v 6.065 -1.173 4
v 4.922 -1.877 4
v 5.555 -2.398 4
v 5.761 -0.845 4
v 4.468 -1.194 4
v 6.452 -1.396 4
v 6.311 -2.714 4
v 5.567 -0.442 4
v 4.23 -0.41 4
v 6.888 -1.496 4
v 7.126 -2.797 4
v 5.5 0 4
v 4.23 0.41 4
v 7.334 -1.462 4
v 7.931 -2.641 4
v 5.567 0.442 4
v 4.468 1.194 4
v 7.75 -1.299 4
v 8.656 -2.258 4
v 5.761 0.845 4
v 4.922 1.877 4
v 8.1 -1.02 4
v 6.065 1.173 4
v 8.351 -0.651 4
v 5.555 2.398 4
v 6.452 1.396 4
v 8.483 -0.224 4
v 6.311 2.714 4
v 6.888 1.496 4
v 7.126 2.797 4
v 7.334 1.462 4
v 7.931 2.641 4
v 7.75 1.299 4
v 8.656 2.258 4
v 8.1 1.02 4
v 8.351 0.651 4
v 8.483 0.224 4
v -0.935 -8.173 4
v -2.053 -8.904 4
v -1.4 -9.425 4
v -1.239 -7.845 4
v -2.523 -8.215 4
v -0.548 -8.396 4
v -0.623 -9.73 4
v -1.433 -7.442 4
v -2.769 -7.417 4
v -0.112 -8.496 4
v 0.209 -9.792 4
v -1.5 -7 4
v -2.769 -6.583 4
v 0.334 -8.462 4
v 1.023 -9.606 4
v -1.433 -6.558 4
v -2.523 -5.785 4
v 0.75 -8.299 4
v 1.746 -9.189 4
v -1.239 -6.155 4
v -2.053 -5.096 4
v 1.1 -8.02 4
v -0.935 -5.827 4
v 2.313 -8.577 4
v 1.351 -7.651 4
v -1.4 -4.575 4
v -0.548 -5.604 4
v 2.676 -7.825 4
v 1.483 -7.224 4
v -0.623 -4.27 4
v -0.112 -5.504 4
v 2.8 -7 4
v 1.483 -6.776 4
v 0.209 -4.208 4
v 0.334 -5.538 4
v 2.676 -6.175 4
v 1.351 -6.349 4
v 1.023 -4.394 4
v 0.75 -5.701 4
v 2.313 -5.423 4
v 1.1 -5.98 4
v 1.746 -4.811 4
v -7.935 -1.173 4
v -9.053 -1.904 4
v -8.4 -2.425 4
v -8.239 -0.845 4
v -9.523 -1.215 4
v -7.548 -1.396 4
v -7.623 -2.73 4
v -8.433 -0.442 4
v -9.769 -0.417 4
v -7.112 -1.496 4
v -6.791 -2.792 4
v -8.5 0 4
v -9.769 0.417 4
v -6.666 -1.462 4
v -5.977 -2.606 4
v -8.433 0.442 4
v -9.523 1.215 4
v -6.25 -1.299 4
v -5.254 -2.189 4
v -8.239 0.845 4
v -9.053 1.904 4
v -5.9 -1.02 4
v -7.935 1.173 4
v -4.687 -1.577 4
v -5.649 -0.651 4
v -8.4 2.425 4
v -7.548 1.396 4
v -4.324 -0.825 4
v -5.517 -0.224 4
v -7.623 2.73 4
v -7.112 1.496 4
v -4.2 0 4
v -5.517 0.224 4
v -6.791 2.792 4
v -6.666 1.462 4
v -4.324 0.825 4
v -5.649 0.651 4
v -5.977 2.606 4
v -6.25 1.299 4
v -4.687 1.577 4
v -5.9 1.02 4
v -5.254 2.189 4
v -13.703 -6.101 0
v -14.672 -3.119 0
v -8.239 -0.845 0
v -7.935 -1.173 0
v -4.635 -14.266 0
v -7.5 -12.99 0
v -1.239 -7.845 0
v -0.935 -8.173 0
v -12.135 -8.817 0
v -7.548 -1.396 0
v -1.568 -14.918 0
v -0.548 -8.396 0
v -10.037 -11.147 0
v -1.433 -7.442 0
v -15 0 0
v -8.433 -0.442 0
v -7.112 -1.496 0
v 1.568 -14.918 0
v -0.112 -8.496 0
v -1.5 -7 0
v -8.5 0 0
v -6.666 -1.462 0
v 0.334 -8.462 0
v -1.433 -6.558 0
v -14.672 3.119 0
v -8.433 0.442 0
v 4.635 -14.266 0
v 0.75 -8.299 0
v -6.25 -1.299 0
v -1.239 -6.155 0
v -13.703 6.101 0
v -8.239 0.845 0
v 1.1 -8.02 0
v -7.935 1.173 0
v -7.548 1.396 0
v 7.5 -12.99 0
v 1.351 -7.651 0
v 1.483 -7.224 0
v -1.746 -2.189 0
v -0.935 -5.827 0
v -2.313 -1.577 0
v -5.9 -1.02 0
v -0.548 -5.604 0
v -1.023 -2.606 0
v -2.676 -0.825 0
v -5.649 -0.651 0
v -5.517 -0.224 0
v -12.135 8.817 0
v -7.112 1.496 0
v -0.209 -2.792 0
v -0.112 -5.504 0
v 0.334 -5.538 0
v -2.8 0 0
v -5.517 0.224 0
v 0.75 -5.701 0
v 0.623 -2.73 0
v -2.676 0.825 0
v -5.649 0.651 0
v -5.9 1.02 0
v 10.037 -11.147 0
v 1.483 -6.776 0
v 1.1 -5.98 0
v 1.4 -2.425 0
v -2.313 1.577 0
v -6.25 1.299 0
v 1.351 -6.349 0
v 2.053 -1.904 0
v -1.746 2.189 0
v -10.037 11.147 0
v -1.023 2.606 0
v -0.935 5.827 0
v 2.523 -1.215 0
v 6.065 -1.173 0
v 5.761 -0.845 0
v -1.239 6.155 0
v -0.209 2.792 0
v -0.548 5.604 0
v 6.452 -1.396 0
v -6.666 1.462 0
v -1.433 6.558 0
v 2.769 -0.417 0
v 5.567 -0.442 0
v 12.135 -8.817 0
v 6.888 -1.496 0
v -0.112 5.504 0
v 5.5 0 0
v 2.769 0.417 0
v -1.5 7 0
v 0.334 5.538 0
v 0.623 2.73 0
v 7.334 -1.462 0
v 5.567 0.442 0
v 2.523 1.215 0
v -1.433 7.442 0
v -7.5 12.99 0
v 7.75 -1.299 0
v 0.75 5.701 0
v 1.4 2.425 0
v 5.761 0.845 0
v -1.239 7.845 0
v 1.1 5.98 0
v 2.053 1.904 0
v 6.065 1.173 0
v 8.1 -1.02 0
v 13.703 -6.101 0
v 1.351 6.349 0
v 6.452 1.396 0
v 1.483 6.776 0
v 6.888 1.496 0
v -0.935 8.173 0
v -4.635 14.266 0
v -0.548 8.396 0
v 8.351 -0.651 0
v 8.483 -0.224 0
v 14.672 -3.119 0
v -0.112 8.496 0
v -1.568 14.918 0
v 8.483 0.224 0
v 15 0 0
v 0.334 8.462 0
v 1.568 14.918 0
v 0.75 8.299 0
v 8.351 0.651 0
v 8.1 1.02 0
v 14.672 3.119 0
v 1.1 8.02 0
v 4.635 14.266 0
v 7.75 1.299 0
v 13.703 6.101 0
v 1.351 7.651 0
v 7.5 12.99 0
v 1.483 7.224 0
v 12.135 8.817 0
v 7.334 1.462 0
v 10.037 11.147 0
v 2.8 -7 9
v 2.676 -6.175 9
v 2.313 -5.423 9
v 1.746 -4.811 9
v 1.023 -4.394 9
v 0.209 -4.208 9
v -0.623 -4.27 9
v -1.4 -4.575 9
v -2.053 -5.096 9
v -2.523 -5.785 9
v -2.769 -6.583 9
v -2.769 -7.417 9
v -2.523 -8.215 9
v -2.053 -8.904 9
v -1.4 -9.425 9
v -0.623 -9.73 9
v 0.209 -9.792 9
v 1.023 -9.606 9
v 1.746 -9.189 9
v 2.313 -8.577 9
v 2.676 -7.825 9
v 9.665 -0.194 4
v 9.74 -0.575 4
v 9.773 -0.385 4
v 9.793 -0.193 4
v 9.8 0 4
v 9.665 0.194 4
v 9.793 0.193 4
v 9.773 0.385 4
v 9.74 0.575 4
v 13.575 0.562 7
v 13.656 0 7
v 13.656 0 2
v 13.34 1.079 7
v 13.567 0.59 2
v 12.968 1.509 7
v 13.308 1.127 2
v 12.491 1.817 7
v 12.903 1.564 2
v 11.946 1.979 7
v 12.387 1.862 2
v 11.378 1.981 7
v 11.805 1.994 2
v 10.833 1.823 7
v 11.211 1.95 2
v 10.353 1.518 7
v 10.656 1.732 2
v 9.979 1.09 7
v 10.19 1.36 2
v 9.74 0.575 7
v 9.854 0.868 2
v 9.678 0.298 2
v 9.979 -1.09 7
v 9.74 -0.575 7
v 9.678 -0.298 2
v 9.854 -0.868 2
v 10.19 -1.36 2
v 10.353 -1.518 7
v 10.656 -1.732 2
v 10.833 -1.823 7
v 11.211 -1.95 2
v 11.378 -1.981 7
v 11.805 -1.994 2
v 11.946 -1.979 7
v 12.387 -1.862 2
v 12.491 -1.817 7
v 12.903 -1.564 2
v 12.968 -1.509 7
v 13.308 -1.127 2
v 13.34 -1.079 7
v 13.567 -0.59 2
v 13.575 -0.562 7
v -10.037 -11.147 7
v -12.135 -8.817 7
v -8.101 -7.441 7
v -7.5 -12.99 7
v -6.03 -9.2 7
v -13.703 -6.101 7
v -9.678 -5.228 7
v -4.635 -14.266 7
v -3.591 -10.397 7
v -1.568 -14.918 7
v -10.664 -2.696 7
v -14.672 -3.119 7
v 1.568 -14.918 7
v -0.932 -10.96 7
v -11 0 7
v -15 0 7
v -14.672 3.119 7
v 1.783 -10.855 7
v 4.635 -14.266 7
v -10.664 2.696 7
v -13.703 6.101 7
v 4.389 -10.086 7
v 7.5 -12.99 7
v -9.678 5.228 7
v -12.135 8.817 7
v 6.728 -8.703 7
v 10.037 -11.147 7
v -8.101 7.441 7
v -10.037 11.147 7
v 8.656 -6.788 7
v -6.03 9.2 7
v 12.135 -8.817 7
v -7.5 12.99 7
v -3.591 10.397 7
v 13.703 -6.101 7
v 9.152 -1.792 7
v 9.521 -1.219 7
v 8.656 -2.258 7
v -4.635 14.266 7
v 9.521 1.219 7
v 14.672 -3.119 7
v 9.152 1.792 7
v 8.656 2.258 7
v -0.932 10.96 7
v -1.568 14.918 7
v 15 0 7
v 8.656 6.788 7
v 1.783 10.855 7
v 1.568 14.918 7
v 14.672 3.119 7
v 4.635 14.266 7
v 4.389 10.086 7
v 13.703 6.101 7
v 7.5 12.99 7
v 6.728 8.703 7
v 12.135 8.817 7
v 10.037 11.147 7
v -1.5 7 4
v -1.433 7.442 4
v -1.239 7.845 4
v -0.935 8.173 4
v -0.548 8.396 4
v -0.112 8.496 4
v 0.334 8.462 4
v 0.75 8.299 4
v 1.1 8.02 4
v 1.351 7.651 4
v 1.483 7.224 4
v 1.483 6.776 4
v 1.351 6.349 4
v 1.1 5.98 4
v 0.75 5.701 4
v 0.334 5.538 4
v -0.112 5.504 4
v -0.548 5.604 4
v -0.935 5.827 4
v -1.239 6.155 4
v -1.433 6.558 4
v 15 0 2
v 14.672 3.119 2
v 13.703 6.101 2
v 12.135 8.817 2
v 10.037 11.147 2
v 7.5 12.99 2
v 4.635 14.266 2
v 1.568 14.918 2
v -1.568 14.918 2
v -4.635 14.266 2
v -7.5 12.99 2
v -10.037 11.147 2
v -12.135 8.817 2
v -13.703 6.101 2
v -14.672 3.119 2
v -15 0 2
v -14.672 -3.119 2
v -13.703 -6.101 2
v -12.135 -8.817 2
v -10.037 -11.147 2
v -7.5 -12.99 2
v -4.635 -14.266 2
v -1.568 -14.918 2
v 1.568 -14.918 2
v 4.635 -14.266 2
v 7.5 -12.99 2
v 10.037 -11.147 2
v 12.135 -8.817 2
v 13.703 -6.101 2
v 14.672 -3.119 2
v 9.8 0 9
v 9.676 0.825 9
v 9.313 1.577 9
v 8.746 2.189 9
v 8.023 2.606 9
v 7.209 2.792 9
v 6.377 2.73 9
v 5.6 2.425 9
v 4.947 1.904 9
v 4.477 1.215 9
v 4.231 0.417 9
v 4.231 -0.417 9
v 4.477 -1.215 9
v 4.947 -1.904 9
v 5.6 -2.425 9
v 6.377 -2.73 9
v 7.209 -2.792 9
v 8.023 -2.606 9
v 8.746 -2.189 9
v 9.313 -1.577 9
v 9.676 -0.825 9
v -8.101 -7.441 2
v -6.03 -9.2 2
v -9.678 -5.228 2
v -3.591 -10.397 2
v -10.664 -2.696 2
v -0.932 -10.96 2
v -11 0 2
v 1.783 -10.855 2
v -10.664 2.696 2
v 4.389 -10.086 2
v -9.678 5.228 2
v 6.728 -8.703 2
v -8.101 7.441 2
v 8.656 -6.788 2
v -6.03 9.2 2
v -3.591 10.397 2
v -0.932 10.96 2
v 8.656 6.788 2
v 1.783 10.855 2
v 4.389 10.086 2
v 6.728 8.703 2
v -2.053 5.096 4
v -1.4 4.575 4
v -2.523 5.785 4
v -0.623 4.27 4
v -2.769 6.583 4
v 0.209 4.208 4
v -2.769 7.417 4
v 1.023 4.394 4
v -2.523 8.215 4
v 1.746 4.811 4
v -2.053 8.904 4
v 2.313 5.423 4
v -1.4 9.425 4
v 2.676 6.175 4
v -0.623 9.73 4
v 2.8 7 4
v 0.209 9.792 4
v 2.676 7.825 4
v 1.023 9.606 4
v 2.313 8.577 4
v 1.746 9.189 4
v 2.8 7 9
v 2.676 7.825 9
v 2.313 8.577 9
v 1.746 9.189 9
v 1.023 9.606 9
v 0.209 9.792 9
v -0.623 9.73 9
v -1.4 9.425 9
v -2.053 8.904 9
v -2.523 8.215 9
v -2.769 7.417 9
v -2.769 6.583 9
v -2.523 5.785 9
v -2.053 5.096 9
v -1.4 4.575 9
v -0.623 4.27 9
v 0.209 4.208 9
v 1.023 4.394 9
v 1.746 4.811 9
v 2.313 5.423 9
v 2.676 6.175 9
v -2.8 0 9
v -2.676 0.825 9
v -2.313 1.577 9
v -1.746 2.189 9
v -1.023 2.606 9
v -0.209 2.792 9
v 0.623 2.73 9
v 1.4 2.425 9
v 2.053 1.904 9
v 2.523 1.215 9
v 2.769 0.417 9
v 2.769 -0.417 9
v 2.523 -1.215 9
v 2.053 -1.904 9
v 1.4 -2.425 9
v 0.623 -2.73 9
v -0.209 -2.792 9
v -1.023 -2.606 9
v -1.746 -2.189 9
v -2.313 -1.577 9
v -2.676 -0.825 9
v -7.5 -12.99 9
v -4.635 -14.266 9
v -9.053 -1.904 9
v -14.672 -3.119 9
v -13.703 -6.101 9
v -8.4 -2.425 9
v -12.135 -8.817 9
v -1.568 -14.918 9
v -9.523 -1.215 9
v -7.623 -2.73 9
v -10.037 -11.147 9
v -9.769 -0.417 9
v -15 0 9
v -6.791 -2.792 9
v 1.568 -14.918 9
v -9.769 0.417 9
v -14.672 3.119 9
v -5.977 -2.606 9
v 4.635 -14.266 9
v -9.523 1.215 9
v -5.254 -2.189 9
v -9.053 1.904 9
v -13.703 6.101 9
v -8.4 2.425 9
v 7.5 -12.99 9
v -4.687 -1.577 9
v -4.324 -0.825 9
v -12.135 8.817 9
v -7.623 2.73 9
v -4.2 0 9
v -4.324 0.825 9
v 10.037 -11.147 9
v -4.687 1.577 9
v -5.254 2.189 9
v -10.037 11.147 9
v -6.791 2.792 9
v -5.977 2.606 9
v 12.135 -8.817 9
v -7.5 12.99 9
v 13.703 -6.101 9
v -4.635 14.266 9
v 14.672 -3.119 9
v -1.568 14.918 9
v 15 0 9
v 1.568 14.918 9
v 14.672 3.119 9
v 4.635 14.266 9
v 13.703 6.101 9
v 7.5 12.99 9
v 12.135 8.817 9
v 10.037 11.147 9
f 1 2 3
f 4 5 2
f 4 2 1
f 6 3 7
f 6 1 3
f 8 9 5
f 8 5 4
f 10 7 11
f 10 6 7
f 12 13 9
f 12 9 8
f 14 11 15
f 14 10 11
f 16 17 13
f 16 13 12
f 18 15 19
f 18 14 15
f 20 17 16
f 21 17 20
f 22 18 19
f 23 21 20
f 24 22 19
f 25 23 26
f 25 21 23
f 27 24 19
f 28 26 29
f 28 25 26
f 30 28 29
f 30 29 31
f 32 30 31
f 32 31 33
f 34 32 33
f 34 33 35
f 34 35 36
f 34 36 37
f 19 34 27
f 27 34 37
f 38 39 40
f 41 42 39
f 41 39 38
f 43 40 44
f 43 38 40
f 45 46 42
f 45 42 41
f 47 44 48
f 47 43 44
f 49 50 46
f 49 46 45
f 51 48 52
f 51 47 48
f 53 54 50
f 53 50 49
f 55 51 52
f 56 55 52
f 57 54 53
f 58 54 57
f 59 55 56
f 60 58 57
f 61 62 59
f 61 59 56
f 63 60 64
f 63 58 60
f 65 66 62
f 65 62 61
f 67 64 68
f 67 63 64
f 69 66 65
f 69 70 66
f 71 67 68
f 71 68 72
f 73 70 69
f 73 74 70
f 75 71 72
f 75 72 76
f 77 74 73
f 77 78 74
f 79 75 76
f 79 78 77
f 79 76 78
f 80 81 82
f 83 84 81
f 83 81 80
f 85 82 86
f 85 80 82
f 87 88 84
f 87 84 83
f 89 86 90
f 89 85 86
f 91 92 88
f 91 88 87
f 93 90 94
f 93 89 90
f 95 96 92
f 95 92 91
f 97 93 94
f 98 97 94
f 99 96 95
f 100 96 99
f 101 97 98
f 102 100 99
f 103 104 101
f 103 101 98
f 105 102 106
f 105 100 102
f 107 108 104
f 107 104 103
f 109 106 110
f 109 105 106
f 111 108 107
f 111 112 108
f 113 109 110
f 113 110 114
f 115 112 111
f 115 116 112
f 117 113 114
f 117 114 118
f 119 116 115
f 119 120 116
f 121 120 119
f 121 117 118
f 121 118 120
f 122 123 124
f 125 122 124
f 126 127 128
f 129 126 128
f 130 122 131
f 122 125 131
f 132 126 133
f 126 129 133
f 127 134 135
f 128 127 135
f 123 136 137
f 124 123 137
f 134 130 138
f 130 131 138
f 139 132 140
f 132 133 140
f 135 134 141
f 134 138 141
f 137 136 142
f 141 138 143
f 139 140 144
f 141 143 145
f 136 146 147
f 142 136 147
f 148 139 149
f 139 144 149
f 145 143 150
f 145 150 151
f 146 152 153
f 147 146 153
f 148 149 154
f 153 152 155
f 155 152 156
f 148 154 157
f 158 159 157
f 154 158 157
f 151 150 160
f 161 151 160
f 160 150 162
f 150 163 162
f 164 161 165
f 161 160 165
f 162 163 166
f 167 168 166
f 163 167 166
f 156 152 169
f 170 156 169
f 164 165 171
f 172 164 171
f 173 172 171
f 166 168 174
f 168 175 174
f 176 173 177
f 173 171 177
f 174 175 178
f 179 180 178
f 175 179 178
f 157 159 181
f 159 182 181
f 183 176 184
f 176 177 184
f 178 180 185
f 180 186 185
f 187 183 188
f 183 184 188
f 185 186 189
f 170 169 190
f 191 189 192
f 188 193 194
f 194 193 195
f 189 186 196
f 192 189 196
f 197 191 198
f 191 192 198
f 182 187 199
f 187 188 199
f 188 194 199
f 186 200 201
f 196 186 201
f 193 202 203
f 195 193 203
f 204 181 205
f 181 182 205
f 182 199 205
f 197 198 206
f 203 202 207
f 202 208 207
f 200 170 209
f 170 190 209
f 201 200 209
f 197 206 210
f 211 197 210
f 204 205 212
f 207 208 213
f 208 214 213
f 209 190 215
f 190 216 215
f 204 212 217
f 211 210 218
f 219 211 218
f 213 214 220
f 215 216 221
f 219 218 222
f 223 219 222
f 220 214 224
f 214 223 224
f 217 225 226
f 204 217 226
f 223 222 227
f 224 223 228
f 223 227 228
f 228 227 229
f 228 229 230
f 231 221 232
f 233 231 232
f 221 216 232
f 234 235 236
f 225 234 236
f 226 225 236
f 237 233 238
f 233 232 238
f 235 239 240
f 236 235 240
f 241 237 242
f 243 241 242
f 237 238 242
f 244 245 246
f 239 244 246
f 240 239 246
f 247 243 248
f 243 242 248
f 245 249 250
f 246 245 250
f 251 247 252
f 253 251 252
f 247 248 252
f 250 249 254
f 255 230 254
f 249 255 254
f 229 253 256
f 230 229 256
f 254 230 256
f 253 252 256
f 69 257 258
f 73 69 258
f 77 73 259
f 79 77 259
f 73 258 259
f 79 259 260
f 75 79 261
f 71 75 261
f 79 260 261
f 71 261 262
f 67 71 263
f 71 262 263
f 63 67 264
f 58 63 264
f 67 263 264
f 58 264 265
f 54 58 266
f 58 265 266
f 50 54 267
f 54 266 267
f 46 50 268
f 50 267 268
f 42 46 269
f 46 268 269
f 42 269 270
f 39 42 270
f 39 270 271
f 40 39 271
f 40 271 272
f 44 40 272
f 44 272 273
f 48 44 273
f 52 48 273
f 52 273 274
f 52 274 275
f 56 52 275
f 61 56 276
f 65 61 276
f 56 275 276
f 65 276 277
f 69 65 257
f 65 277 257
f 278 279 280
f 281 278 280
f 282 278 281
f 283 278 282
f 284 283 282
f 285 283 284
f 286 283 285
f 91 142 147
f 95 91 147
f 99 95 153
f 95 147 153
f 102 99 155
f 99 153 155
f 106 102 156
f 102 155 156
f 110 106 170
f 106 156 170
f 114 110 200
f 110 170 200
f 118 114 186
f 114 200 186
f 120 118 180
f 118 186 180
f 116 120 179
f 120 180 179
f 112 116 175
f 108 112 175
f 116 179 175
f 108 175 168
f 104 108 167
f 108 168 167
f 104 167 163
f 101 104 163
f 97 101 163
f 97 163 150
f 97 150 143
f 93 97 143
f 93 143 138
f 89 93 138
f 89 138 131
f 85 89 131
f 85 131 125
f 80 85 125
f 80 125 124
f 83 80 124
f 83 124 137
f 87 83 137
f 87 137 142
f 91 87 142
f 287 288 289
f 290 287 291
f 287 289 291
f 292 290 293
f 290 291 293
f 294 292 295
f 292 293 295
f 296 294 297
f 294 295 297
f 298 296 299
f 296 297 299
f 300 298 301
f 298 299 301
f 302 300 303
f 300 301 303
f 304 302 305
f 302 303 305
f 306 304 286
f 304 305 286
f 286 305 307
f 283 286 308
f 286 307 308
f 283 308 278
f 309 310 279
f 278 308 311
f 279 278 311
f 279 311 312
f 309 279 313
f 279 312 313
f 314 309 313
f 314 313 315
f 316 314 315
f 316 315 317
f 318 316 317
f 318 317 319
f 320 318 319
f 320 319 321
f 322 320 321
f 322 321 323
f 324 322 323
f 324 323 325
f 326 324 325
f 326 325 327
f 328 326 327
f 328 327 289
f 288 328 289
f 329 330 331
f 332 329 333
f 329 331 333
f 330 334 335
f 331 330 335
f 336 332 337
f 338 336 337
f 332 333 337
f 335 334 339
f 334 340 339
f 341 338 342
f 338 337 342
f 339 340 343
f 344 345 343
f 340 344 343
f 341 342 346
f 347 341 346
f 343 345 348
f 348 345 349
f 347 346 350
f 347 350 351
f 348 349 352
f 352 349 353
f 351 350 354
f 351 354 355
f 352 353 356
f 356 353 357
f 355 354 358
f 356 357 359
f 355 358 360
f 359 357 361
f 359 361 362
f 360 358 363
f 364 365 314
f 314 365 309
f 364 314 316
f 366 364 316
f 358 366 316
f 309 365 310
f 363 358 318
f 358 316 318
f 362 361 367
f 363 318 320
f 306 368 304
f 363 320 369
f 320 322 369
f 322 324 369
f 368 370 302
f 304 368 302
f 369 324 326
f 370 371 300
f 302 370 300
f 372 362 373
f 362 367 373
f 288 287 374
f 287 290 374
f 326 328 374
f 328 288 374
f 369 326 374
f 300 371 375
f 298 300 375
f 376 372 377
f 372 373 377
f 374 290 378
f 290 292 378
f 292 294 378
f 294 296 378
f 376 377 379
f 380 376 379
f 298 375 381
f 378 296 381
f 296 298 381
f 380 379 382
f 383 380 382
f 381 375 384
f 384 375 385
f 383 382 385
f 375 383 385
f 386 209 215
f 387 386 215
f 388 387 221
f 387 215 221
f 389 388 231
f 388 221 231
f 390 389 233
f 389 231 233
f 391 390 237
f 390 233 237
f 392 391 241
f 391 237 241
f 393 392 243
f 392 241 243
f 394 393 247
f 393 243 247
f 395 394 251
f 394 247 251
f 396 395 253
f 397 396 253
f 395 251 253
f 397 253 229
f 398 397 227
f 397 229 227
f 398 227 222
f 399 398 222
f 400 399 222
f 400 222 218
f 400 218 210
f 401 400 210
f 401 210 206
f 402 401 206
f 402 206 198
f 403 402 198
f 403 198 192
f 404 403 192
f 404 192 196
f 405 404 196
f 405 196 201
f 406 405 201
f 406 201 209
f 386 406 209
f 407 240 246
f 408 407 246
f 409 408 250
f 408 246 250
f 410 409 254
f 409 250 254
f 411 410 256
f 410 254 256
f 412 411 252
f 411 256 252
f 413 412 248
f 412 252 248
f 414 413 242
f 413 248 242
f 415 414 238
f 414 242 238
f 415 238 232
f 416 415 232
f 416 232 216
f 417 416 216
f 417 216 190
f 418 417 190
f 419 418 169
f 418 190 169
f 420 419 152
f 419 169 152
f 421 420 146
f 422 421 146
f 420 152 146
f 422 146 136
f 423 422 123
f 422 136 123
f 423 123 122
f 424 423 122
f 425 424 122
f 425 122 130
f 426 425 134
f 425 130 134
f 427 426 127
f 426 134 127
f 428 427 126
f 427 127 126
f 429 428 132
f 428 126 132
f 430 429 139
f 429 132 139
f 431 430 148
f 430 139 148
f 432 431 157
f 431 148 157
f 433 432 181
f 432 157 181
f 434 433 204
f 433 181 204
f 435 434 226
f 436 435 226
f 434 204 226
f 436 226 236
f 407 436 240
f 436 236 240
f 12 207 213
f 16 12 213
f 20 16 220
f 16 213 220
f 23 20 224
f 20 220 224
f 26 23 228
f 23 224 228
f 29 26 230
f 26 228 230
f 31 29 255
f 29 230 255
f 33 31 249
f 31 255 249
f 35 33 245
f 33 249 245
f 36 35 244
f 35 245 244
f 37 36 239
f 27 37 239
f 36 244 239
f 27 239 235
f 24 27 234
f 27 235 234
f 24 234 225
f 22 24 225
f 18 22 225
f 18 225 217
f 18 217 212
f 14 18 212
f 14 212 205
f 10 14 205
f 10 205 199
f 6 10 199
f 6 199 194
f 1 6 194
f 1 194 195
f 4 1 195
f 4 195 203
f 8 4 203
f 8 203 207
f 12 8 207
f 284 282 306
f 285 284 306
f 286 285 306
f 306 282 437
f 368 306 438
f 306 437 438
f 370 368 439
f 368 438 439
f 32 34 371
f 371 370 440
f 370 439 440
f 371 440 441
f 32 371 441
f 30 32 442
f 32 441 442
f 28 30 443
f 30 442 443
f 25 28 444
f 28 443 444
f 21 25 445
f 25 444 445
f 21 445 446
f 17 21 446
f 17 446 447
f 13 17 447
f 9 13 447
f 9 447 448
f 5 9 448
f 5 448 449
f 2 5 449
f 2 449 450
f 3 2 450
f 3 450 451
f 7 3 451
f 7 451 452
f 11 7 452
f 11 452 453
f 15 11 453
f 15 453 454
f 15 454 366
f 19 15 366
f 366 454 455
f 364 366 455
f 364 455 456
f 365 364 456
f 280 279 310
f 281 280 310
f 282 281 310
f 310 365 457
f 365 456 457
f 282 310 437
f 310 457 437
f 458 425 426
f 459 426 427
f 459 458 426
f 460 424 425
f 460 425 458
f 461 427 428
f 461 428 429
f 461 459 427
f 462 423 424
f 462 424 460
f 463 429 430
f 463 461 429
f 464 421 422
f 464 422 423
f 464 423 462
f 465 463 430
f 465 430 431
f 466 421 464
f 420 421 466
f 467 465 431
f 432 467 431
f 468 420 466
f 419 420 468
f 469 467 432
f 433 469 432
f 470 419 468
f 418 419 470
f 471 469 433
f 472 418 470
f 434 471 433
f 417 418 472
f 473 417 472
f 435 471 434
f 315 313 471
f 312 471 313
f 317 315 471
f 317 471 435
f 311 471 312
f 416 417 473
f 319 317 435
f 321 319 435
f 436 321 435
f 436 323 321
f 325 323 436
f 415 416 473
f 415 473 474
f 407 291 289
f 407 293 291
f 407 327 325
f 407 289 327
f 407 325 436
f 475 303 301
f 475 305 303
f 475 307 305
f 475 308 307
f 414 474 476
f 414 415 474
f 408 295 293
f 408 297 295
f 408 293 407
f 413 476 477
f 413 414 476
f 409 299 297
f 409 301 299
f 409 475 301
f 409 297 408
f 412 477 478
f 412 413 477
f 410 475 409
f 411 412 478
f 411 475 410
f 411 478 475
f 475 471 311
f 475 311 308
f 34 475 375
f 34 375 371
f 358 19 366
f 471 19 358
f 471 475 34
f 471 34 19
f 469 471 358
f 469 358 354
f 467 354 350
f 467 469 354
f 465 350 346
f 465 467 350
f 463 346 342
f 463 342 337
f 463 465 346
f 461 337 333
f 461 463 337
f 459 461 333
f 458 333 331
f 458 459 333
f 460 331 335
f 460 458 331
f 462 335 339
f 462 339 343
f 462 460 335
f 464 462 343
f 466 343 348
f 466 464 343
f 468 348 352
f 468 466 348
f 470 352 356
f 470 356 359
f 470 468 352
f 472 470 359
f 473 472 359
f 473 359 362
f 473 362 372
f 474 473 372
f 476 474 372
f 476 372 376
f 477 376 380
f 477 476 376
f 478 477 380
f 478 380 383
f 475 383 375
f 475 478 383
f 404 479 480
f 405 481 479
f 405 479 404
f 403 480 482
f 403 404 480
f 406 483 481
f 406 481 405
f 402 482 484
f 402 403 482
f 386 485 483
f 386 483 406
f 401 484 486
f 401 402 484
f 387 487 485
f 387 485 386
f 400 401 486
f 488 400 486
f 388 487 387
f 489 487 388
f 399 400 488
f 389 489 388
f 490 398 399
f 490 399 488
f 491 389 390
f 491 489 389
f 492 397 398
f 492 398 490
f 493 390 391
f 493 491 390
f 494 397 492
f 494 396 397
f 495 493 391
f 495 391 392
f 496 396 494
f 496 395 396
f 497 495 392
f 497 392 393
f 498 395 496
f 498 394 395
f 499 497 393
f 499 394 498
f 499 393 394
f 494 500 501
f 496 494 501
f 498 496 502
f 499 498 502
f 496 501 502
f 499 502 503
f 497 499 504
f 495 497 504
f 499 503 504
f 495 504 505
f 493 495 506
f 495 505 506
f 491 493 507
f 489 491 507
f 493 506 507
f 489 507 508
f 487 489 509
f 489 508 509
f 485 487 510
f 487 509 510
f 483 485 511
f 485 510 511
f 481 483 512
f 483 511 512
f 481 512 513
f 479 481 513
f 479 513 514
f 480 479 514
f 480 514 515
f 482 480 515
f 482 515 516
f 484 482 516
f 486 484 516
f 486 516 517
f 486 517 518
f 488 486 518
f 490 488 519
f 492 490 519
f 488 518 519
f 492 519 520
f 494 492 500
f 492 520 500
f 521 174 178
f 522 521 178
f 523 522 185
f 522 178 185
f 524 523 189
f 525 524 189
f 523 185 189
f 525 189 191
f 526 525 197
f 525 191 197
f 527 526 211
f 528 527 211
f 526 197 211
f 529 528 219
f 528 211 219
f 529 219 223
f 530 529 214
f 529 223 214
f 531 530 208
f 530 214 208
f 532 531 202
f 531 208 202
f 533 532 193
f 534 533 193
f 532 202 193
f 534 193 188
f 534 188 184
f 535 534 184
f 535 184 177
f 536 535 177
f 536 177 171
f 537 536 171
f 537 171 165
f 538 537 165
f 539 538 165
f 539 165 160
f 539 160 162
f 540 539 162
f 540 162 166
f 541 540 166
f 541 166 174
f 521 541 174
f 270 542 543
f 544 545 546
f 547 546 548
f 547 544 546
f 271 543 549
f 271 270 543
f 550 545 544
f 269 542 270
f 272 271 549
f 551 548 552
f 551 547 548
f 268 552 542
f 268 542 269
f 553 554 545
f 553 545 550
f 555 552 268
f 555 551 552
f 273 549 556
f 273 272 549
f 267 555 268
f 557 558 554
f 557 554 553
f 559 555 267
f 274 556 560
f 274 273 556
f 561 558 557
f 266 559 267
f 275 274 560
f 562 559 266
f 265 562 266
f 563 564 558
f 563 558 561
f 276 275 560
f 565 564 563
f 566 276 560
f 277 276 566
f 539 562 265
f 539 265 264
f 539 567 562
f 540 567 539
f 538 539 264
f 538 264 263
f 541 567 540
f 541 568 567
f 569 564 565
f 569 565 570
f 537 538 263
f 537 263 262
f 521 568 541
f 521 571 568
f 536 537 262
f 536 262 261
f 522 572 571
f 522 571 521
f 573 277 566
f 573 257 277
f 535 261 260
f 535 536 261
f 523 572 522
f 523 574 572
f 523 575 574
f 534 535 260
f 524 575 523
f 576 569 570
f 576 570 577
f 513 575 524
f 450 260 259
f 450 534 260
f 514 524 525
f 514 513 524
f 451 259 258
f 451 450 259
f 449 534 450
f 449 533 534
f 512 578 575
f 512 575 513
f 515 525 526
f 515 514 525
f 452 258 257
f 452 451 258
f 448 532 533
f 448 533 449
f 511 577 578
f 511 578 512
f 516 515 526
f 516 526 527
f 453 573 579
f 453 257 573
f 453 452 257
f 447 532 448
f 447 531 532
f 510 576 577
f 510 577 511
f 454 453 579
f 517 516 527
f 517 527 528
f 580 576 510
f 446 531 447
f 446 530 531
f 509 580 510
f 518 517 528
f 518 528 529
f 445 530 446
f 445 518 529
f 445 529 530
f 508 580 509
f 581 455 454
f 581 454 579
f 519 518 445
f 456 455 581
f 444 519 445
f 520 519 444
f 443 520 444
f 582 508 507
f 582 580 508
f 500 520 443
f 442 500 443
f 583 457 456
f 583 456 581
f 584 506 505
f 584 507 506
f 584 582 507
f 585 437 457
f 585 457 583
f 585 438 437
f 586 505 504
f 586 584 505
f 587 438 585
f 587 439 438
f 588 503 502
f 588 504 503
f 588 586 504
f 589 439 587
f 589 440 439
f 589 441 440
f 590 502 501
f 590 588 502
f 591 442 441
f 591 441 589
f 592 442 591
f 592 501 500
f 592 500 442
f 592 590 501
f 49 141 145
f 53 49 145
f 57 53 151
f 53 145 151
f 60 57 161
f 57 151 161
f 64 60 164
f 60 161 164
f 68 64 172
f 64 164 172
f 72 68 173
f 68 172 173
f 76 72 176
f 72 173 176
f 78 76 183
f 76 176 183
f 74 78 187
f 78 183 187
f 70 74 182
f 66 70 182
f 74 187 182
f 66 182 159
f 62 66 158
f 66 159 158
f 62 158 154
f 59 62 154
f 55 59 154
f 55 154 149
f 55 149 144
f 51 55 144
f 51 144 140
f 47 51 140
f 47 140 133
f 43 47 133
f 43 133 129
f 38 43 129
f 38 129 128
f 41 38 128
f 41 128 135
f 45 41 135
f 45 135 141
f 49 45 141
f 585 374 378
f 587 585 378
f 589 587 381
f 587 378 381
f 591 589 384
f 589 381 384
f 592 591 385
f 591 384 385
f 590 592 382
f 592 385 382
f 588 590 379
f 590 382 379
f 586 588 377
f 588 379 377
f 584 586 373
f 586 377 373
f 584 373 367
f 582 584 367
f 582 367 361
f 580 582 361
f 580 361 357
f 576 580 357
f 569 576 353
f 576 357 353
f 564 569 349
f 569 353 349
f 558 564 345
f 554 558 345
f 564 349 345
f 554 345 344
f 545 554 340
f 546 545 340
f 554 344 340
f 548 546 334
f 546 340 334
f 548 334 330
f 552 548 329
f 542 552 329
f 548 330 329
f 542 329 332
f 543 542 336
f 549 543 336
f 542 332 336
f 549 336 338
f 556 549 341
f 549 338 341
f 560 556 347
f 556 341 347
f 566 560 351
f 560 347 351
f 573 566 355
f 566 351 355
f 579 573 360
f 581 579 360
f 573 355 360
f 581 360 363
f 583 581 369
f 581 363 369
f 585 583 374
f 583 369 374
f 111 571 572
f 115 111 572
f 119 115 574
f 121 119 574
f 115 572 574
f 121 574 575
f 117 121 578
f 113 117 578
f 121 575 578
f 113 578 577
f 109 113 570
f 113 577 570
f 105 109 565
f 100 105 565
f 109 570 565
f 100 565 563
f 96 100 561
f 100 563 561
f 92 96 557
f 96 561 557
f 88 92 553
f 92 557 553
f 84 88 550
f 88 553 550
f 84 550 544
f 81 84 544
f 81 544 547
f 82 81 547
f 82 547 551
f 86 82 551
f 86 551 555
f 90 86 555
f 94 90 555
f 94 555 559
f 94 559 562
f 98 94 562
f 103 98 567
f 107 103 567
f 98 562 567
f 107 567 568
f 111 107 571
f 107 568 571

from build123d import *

# Parameters (mm, degrees)
SKETCH_1_R          = 15
EXTRUDE_1_DEPTH     = 2
SKETCH_2_R          = 2
EXTRUDE_2_DEPTH     = 5
SKETCH_3_R          = 15
EXTRUDE_3_DEPTH     = 2
CUT_EXTRUDE_1_REACH = 11
SKETCH_4_R          = 1.5
SKETCH_4_R_2        = 2.8
SKETCH_5_R          = 2.8
CUT_EXTRUDE_2_DEPTH = 5


with BuildPart() as part:
    # 草图1 → 凸台-拉伸1 (new body)
    with BuildSketch(Plane.XY):
        Circle(SKETCH_1_R)
    extrude(amount=EXTRUDE_1_DEPTH)

    # 草图2 → 凸台-拉伸2 (add)
    with BuildSketch(Plane.XY.offset(2)):
        with Locations((11.655867717, 0)):
            Circle(SKETCH_2_R)
        with BuildLine():
            Line((8.655867717, 6.787927082), (8.655867717, -6.787927082))
            ThreePointArc((8.655867717, -6.787927082), (-11, 0), (8.655867717, 6.787927082))
        make_face()
    extrude(amount=EXTRUDE_2_DEPTH)

    # 草图3 → 凸台-拉伸3 (add)
    with BuildSketch(Plane.XY.offset(7)):
        Circle(SKETCH_3_R)
    extrude(amount=EXTRUDE_3_DEPTH)

    # 草图4 → 切除-拉伸1 (cut, up to next)
    with BuildSketch(Plane(origin=(0, 0, 0), x_dir=(-1, 0, 0), z_dir=(0, 0, -1)), mode=Mode.PRIVATE) as cut_extrude_1_sk1:
        with Locations((0, 7)):
            Circle(SKETCH_4_R)
    cut_extrude_1_tool1 = extrude(cut_extrude_1_sk1.sketch, amount=-CUT_EXTRUDE_1_REACH, mode=Mode.PRIVATE) & part.part
    add(cut_extrude_1_tool1.solids().sort_by_distance((0, 7, 0))[0], mode=Mode.SUBTRACT)
    # 草图4 → 切除-拉伸1 (cut, up to next)
    with BuildSketch(Plane(origin=(0, 0, 0), x_dir=(-1, 0, 0), z_dir=(0, 0, -1)), mode=Mode.PRIVATE) as cut_extrude_1_sk2:
        with Locations((0, -7)):
            Circle(SKETCH_4_R)
    cut_extrude_1_tool2 = extrude(cut_extrude_1_sk2.sketch, amount=-CUT_EXTRUDE_1_REACH, mode=Mode.PRIVATE) & part.part
    add(cut_extrude_1_tool2.solids().sort_by_distance((0, -7, 0))[0], mode=Mode.SUBTRACT)
    # 草图4 → 切除-拉伸1 (cut, up to next)
    with BuildSketch(Plane(origin=(0, 0, 0), x_dir=(-1, 0, 0), z_dir=(0, 0, -1)), mode=Mode.PRIVATE) as cut_extrude_1_sk3:
        with Locations((7, 0)):
            Circle(SKETCH_4_R)
    cut_extrude_1_tool3 = extrude(cut_extrude_1_sk3.sketch, amount=-CUT_EXTRUDE_1_REACH, mode=Mode.PRIVATE) & part.part
    add(cut_extrude_1_tool3.solids().sort_by_distance((-7, 0, 0))[0], mode=Mode.SUBTRACT)
    # 草图4 → 切除-拉伸1 (cut, up to next)
    with BuildSketch(Plane(origin=(0, 0, 0), x_dir=(-1, 0, 0), z_dir=(0, 0, -1)), mode=Mode.PRIVATE) as cut_extrude_1_sk4:
        with Locations((-7, 0)):
            Circle(SKETCH_4_R)
    cut_extrude_1_tool4 = extrude(cut_extrude_1_sk4.sketch, amount=-CUT_EXTRUDE_1_REACH, mode=Mode.PRIVATE) & part.part
    add(cut_extrude_1_tool4.solids().sort_by_distance((7, 0, 0))[0], mode=Mode.SUBTRACT)
    # 草图4 → 切除-拉伸1 (cut, up to next)
    with BuildSketch(Plane(origin=(0, 0, 0), x_dir=(-1, 0, 0), z_dir=(0, 0, -1)), mode=Mode.PRIVATE) as cut_extrude_1_sk5:
        Circle(SKETCH_4_R_2)
    cut_extrude_1_tool5 = extrude(cut_extrude_1_sk5.sketch, amount=-CUT_EXTRUDE_1_REACH, mode=Mode.PRIVATE) & part.part
    add(cut_extrude_1_tool5.solids().sort_by_distance((0, 0, 0))[0], mode=Mode.SUBTRACT)

    # 草图5 → 切除-拉伸2 (cut)
    with BuildSketch(Plane.XY.offset(9)):
        with Locations((0, 7)):
            Circle(SKETCH_5_R)
        with Locations((7, 0)):
            Circle(SKETCH_5_R)
        with Locations((-7, 0)):
            Circle(SKETCH_5_R)
        with Locations((0, -7)):
            Circle(SKETCH_5_R)
    extrude(amount=-CUT_EXTRUDE_2_DEPTH, mode=Mode.SUBTRACT)


solid = part.part
